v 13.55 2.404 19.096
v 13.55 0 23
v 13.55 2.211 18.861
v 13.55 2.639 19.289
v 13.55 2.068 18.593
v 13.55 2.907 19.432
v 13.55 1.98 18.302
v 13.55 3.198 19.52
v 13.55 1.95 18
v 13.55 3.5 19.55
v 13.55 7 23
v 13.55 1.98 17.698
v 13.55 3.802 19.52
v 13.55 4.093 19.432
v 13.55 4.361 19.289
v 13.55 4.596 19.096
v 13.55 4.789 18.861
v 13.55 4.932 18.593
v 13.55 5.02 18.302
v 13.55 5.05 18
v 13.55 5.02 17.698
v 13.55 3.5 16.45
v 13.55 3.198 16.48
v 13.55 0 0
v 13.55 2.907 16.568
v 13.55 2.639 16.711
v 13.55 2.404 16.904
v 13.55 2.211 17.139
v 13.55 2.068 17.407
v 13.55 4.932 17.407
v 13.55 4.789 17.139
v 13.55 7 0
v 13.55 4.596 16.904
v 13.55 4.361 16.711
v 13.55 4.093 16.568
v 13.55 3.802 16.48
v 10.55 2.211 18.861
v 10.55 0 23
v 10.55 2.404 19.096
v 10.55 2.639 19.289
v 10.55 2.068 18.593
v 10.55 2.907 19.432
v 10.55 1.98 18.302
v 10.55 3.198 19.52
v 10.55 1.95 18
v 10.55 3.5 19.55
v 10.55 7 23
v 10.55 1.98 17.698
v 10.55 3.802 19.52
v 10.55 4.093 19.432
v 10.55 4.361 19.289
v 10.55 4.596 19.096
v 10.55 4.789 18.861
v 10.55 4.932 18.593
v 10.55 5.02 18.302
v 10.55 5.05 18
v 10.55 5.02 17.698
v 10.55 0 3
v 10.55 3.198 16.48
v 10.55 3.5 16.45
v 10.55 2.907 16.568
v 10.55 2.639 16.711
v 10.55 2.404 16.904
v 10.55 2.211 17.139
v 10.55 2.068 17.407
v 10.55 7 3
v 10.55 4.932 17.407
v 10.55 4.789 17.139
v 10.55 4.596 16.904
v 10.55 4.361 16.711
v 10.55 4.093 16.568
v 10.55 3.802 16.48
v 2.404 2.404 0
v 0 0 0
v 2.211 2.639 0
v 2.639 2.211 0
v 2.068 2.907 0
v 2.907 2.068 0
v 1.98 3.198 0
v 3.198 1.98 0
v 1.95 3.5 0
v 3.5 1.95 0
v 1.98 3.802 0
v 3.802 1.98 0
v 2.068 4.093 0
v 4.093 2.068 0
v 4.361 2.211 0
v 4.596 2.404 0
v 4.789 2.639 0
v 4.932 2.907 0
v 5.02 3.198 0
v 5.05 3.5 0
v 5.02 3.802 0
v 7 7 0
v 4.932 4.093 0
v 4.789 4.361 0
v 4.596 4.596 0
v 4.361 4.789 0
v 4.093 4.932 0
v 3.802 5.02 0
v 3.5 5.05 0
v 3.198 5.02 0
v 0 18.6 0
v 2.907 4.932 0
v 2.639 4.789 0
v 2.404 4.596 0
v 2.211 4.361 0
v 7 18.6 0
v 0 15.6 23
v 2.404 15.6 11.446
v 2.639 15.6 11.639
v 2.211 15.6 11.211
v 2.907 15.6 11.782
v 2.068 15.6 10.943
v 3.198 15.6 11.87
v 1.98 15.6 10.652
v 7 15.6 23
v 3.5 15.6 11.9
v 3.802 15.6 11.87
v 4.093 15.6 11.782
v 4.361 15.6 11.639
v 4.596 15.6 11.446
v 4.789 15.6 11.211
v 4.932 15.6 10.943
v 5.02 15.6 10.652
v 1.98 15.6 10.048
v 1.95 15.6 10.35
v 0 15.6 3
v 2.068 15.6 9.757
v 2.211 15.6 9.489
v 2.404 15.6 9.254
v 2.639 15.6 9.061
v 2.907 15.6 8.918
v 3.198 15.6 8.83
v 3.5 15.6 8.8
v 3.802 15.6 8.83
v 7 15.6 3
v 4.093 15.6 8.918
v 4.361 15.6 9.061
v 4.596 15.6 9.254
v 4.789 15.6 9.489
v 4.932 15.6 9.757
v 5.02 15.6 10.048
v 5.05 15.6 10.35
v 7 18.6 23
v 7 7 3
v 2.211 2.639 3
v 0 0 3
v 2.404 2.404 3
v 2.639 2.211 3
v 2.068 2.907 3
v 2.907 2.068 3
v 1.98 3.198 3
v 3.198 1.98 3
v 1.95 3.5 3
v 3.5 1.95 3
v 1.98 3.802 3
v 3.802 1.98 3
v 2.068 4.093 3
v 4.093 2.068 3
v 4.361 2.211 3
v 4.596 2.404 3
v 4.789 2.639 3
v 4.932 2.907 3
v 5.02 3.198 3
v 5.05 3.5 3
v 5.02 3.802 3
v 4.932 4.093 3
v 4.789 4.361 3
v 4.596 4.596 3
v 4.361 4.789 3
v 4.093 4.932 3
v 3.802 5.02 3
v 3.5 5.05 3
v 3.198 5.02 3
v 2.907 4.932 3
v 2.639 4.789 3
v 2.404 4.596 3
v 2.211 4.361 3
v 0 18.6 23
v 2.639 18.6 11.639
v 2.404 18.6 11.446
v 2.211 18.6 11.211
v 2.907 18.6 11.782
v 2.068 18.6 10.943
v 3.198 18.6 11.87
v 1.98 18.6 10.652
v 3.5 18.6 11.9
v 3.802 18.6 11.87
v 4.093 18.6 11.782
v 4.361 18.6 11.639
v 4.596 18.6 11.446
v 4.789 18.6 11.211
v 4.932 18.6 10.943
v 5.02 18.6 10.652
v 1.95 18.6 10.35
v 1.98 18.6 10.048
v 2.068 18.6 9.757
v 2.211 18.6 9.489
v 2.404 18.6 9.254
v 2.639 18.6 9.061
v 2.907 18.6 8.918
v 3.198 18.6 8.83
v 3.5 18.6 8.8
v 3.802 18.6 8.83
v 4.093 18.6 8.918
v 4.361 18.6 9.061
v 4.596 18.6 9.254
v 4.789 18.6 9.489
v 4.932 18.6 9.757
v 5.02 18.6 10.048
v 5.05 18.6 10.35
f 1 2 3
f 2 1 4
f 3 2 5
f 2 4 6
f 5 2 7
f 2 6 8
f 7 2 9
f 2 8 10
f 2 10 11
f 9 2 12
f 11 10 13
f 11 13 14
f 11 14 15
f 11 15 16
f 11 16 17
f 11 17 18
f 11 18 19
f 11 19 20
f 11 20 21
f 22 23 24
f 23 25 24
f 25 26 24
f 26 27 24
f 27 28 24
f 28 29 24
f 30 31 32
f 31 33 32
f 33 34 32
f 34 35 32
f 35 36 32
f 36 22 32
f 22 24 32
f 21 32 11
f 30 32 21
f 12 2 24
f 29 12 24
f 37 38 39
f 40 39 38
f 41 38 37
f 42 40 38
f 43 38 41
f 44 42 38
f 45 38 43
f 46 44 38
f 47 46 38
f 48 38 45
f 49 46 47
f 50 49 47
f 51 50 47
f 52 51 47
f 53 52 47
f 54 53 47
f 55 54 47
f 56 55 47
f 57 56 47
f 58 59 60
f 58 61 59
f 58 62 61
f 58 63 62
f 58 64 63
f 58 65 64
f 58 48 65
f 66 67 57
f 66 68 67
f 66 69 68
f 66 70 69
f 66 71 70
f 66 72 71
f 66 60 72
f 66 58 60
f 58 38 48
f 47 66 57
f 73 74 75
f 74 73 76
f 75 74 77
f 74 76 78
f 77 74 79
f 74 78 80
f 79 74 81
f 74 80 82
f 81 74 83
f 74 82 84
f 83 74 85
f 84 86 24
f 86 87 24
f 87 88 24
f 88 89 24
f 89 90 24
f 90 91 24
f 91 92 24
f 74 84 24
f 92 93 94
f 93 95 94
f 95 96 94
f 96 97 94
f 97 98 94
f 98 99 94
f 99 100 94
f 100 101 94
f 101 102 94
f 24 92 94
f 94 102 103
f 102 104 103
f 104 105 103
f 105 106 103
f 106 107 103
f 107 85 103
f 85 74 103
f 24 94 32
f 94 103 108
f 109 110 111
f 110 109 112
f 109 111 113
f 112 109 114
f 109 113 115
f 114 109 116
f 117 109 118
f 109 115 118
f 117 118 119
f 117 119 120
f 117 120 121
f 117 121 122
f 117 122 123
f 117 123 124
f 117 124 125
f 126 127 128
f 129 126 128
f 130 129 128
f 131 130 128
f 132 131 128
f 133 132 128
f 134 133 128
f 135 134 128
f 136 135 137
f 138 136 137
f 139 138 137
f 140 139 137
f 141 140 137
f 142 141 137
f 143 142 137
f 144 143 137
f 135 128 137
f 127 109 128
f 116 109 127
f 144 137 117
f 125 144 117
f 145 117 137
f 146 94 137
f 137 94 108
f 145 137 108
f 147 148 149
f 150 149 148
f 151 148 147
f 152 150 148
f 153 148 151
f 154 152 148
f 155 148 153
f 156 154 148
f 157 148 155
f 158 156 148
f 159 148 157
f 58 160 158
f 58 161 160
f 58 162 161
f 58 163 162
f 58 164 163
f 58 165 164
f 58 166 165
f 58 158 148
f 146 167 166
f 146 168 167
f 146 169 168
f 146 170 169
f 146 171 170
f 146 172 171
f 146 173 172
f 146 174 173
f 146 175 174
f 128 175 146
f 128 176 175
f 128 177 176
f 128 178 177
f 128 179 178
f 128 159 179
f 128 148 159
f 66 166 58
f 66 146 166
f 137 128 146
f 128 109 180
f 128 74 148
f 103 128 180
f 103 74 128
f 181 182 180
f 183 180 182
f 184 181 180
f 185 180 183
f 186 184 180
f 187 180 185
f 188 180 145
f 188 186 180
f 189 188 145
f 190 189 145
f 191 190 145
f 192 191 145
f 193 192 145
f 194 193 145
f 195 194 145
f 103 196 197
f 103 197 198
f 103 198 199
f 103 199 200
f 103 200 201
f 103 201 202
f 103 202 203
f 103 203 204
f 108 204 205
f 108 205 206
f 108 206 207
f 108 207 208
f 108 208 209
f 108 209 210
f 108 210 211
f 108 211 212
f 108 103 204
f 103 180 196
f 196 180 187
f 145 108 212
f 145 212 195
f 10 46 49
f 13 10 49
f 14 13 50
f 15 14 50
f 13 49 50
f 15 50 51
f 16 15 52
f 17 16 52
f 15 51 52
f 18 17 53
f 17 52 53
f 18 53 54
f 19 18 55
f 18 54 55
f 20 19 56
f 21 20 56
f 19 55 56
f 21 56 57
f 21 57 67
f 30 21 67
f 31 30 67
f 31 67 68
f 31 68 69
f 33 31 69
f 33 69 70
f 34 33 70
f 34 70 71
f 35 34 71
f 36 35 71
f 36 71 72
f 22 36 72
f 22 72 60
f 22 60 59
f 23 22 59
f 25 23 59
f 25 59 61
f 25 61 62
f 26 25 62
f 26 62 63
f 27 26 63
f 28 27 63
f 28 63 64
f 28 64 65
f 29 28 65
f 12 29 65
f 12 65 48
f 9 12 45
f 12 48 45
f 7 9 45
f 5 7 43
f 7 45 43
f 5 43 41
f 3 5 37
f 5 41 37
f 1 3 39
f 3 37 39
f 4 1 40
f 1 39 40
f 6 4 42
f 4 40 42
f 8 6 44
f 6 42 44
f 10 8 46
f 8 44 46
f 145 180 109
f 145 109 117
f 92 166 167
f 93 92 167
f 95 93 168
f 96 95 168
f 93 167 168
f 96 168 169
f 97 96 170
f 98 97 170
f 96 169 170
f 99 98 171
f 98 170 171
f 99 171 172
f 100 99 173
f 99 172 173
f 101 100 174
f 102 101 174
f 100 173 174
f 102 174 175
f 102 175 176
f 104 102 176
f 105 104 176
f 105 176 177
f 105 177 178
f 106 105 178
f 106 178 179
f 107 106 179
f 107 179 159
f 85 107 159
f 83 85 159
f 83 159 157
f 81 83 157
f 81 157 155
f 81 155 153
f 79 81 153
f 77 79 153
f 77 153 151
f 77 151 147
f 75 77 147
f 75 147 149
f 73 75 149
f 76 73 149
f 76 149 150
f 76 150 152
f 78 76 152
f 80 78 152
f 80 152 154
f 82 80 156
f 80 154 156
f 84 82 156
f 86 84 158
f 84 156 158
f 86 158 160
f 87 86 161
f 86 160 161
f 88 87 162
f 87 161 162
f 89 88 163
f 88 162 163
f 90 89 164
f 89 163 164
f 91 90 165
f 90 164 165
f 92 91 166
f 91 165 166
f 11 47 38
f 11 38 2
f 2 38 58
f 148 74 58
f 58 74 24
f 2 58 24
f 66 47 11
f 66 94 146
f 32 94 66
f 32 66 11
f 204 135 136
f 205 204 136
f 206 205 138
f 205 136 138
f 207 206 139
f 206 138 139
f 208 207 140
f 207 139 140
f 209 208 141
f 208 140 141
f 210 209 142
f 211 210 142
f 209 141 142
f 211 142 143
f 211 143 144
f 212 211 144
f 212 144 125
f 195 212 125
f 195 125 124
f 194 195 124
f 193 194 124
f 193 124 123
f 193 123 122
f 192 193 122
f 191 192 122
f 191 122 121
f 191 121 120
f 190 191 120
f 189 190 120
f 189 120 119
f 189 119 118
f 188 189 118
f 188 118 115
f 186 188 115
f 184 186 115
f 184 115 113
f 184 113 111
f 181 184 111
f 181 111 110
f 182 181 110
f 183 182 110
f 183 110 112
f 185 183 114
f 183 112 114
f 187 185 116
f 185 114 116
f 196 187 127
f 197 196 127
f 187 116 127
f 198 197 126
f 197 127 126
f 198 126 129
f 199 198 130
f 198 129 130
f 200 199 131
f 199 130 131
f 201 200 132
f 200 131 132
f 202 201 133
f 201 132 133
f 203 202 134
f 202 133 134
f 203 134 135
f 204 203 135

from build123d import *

# Parameters (mm, degrees)
ESQUISSE1_W             = 7
ESQUISSE1_H             = 11.6
ESQUISSE1_H_2           = 7
ESQUISSE1_W_2           = 6.55
BOSS_EXTRU_1_DEPTH      = 3
ESQUISSE2_W             = 7
ESQUISSE2_H             = 3
BOSS_EXTRU_2_DEPTH      = 20
ESQUISSE3_W             = 3
ESQUISSE3_H             = 7
BOSS_EXTRU_3_DEPTH      = 20
ESQUISSE4_R             = 1.55
ENL_V_MAT_EXTRU_1_DEPTH = 20
ESQUISSE5_R             = 1.55
ENL_V_MAT_EXTRU_2_DEPTH = 20
ESQUISSE6_R             = 1.55
ENL_V_MAT_EXTRU_3_DEPTH = 20


with BuildPart() as part:
    # Esquisse1 → Boss.-Extru.1 (new body)
    with BuildSketch(Plane.XY):
        with Locations((3.5, 12.8)):
            Rectangle(ESQUISSE1_W, ESQUISSE1_H)
        with Locations((3.5, 3.5)):
            Rectangle(ESQUISSE1_W, ESQUISSE1_H_2)
        with Locations((10.275, 3.5)):
            Rectangle(ESQUISSE1_W_2, ESQUISSE1_H_2)
    extrude(amount=BOSS_EXTRU_1_DEPTH)

    # Esquisse2 → Boss.-Extru.2 (add)
    with BuildSketch(Plane.XY.offset(3)):
        with Locations((3.5, 17.1)):
            Rectangle(ESQUISSE2_W, ESQUISSE2_H)
    extrude(amount=BOSS_EXTRU_2_DEPTH)

    # Esquisse3 → Boss.-Extru.3 (add)
    with BuildSketch(Plane.XY.offset(3)):
        with Locations((12.05, 3.5)):
            Rectangle(ESQUISSE3_W, ESQUISSE3_H)
    extrude(amount=BOSS_EXTRU_3_DEPTH)

    # Esquisse4 → Enlèv. mat.-Extru.1 (cut)
    with BuildSketch(Plane.XZ.offset(-15.6)):
        with Locations(Location((3.5, 10.35, 0), (0, 0, 270))):
            Circle(ESQUISSE4_R)
    extrude(amount=-ENL_V_MAT_EXTRU_1_DEPTH, mode=Mode.SUBTRACT)

    # Esquisse5 → Enlèv. mat.-Extru.2 (cut)
    with BuildSketch(Plane.ZY.offset(-10.55)):
        with Locations((18, 3.5)):
            Circle(ESQUISSE5_R)
    extrude(amount=-ENL_V_MAT_EXTRU_2_DEPTH, mode=Mode.SUBTRACT)

    # Esquisse6 → Enlèv. mat.-Extru.3 (cut)
    with BuildSketch(Plane.XY.offset(3)):
        with Locations((3.5, 3.5)):
            Circle(ESQUISSE6_R)
    extrude(amount=-ENL_V_MAT_EXTRU_3_DEPTH, mode=Mode.SUBTRACT)


solid = part.part
